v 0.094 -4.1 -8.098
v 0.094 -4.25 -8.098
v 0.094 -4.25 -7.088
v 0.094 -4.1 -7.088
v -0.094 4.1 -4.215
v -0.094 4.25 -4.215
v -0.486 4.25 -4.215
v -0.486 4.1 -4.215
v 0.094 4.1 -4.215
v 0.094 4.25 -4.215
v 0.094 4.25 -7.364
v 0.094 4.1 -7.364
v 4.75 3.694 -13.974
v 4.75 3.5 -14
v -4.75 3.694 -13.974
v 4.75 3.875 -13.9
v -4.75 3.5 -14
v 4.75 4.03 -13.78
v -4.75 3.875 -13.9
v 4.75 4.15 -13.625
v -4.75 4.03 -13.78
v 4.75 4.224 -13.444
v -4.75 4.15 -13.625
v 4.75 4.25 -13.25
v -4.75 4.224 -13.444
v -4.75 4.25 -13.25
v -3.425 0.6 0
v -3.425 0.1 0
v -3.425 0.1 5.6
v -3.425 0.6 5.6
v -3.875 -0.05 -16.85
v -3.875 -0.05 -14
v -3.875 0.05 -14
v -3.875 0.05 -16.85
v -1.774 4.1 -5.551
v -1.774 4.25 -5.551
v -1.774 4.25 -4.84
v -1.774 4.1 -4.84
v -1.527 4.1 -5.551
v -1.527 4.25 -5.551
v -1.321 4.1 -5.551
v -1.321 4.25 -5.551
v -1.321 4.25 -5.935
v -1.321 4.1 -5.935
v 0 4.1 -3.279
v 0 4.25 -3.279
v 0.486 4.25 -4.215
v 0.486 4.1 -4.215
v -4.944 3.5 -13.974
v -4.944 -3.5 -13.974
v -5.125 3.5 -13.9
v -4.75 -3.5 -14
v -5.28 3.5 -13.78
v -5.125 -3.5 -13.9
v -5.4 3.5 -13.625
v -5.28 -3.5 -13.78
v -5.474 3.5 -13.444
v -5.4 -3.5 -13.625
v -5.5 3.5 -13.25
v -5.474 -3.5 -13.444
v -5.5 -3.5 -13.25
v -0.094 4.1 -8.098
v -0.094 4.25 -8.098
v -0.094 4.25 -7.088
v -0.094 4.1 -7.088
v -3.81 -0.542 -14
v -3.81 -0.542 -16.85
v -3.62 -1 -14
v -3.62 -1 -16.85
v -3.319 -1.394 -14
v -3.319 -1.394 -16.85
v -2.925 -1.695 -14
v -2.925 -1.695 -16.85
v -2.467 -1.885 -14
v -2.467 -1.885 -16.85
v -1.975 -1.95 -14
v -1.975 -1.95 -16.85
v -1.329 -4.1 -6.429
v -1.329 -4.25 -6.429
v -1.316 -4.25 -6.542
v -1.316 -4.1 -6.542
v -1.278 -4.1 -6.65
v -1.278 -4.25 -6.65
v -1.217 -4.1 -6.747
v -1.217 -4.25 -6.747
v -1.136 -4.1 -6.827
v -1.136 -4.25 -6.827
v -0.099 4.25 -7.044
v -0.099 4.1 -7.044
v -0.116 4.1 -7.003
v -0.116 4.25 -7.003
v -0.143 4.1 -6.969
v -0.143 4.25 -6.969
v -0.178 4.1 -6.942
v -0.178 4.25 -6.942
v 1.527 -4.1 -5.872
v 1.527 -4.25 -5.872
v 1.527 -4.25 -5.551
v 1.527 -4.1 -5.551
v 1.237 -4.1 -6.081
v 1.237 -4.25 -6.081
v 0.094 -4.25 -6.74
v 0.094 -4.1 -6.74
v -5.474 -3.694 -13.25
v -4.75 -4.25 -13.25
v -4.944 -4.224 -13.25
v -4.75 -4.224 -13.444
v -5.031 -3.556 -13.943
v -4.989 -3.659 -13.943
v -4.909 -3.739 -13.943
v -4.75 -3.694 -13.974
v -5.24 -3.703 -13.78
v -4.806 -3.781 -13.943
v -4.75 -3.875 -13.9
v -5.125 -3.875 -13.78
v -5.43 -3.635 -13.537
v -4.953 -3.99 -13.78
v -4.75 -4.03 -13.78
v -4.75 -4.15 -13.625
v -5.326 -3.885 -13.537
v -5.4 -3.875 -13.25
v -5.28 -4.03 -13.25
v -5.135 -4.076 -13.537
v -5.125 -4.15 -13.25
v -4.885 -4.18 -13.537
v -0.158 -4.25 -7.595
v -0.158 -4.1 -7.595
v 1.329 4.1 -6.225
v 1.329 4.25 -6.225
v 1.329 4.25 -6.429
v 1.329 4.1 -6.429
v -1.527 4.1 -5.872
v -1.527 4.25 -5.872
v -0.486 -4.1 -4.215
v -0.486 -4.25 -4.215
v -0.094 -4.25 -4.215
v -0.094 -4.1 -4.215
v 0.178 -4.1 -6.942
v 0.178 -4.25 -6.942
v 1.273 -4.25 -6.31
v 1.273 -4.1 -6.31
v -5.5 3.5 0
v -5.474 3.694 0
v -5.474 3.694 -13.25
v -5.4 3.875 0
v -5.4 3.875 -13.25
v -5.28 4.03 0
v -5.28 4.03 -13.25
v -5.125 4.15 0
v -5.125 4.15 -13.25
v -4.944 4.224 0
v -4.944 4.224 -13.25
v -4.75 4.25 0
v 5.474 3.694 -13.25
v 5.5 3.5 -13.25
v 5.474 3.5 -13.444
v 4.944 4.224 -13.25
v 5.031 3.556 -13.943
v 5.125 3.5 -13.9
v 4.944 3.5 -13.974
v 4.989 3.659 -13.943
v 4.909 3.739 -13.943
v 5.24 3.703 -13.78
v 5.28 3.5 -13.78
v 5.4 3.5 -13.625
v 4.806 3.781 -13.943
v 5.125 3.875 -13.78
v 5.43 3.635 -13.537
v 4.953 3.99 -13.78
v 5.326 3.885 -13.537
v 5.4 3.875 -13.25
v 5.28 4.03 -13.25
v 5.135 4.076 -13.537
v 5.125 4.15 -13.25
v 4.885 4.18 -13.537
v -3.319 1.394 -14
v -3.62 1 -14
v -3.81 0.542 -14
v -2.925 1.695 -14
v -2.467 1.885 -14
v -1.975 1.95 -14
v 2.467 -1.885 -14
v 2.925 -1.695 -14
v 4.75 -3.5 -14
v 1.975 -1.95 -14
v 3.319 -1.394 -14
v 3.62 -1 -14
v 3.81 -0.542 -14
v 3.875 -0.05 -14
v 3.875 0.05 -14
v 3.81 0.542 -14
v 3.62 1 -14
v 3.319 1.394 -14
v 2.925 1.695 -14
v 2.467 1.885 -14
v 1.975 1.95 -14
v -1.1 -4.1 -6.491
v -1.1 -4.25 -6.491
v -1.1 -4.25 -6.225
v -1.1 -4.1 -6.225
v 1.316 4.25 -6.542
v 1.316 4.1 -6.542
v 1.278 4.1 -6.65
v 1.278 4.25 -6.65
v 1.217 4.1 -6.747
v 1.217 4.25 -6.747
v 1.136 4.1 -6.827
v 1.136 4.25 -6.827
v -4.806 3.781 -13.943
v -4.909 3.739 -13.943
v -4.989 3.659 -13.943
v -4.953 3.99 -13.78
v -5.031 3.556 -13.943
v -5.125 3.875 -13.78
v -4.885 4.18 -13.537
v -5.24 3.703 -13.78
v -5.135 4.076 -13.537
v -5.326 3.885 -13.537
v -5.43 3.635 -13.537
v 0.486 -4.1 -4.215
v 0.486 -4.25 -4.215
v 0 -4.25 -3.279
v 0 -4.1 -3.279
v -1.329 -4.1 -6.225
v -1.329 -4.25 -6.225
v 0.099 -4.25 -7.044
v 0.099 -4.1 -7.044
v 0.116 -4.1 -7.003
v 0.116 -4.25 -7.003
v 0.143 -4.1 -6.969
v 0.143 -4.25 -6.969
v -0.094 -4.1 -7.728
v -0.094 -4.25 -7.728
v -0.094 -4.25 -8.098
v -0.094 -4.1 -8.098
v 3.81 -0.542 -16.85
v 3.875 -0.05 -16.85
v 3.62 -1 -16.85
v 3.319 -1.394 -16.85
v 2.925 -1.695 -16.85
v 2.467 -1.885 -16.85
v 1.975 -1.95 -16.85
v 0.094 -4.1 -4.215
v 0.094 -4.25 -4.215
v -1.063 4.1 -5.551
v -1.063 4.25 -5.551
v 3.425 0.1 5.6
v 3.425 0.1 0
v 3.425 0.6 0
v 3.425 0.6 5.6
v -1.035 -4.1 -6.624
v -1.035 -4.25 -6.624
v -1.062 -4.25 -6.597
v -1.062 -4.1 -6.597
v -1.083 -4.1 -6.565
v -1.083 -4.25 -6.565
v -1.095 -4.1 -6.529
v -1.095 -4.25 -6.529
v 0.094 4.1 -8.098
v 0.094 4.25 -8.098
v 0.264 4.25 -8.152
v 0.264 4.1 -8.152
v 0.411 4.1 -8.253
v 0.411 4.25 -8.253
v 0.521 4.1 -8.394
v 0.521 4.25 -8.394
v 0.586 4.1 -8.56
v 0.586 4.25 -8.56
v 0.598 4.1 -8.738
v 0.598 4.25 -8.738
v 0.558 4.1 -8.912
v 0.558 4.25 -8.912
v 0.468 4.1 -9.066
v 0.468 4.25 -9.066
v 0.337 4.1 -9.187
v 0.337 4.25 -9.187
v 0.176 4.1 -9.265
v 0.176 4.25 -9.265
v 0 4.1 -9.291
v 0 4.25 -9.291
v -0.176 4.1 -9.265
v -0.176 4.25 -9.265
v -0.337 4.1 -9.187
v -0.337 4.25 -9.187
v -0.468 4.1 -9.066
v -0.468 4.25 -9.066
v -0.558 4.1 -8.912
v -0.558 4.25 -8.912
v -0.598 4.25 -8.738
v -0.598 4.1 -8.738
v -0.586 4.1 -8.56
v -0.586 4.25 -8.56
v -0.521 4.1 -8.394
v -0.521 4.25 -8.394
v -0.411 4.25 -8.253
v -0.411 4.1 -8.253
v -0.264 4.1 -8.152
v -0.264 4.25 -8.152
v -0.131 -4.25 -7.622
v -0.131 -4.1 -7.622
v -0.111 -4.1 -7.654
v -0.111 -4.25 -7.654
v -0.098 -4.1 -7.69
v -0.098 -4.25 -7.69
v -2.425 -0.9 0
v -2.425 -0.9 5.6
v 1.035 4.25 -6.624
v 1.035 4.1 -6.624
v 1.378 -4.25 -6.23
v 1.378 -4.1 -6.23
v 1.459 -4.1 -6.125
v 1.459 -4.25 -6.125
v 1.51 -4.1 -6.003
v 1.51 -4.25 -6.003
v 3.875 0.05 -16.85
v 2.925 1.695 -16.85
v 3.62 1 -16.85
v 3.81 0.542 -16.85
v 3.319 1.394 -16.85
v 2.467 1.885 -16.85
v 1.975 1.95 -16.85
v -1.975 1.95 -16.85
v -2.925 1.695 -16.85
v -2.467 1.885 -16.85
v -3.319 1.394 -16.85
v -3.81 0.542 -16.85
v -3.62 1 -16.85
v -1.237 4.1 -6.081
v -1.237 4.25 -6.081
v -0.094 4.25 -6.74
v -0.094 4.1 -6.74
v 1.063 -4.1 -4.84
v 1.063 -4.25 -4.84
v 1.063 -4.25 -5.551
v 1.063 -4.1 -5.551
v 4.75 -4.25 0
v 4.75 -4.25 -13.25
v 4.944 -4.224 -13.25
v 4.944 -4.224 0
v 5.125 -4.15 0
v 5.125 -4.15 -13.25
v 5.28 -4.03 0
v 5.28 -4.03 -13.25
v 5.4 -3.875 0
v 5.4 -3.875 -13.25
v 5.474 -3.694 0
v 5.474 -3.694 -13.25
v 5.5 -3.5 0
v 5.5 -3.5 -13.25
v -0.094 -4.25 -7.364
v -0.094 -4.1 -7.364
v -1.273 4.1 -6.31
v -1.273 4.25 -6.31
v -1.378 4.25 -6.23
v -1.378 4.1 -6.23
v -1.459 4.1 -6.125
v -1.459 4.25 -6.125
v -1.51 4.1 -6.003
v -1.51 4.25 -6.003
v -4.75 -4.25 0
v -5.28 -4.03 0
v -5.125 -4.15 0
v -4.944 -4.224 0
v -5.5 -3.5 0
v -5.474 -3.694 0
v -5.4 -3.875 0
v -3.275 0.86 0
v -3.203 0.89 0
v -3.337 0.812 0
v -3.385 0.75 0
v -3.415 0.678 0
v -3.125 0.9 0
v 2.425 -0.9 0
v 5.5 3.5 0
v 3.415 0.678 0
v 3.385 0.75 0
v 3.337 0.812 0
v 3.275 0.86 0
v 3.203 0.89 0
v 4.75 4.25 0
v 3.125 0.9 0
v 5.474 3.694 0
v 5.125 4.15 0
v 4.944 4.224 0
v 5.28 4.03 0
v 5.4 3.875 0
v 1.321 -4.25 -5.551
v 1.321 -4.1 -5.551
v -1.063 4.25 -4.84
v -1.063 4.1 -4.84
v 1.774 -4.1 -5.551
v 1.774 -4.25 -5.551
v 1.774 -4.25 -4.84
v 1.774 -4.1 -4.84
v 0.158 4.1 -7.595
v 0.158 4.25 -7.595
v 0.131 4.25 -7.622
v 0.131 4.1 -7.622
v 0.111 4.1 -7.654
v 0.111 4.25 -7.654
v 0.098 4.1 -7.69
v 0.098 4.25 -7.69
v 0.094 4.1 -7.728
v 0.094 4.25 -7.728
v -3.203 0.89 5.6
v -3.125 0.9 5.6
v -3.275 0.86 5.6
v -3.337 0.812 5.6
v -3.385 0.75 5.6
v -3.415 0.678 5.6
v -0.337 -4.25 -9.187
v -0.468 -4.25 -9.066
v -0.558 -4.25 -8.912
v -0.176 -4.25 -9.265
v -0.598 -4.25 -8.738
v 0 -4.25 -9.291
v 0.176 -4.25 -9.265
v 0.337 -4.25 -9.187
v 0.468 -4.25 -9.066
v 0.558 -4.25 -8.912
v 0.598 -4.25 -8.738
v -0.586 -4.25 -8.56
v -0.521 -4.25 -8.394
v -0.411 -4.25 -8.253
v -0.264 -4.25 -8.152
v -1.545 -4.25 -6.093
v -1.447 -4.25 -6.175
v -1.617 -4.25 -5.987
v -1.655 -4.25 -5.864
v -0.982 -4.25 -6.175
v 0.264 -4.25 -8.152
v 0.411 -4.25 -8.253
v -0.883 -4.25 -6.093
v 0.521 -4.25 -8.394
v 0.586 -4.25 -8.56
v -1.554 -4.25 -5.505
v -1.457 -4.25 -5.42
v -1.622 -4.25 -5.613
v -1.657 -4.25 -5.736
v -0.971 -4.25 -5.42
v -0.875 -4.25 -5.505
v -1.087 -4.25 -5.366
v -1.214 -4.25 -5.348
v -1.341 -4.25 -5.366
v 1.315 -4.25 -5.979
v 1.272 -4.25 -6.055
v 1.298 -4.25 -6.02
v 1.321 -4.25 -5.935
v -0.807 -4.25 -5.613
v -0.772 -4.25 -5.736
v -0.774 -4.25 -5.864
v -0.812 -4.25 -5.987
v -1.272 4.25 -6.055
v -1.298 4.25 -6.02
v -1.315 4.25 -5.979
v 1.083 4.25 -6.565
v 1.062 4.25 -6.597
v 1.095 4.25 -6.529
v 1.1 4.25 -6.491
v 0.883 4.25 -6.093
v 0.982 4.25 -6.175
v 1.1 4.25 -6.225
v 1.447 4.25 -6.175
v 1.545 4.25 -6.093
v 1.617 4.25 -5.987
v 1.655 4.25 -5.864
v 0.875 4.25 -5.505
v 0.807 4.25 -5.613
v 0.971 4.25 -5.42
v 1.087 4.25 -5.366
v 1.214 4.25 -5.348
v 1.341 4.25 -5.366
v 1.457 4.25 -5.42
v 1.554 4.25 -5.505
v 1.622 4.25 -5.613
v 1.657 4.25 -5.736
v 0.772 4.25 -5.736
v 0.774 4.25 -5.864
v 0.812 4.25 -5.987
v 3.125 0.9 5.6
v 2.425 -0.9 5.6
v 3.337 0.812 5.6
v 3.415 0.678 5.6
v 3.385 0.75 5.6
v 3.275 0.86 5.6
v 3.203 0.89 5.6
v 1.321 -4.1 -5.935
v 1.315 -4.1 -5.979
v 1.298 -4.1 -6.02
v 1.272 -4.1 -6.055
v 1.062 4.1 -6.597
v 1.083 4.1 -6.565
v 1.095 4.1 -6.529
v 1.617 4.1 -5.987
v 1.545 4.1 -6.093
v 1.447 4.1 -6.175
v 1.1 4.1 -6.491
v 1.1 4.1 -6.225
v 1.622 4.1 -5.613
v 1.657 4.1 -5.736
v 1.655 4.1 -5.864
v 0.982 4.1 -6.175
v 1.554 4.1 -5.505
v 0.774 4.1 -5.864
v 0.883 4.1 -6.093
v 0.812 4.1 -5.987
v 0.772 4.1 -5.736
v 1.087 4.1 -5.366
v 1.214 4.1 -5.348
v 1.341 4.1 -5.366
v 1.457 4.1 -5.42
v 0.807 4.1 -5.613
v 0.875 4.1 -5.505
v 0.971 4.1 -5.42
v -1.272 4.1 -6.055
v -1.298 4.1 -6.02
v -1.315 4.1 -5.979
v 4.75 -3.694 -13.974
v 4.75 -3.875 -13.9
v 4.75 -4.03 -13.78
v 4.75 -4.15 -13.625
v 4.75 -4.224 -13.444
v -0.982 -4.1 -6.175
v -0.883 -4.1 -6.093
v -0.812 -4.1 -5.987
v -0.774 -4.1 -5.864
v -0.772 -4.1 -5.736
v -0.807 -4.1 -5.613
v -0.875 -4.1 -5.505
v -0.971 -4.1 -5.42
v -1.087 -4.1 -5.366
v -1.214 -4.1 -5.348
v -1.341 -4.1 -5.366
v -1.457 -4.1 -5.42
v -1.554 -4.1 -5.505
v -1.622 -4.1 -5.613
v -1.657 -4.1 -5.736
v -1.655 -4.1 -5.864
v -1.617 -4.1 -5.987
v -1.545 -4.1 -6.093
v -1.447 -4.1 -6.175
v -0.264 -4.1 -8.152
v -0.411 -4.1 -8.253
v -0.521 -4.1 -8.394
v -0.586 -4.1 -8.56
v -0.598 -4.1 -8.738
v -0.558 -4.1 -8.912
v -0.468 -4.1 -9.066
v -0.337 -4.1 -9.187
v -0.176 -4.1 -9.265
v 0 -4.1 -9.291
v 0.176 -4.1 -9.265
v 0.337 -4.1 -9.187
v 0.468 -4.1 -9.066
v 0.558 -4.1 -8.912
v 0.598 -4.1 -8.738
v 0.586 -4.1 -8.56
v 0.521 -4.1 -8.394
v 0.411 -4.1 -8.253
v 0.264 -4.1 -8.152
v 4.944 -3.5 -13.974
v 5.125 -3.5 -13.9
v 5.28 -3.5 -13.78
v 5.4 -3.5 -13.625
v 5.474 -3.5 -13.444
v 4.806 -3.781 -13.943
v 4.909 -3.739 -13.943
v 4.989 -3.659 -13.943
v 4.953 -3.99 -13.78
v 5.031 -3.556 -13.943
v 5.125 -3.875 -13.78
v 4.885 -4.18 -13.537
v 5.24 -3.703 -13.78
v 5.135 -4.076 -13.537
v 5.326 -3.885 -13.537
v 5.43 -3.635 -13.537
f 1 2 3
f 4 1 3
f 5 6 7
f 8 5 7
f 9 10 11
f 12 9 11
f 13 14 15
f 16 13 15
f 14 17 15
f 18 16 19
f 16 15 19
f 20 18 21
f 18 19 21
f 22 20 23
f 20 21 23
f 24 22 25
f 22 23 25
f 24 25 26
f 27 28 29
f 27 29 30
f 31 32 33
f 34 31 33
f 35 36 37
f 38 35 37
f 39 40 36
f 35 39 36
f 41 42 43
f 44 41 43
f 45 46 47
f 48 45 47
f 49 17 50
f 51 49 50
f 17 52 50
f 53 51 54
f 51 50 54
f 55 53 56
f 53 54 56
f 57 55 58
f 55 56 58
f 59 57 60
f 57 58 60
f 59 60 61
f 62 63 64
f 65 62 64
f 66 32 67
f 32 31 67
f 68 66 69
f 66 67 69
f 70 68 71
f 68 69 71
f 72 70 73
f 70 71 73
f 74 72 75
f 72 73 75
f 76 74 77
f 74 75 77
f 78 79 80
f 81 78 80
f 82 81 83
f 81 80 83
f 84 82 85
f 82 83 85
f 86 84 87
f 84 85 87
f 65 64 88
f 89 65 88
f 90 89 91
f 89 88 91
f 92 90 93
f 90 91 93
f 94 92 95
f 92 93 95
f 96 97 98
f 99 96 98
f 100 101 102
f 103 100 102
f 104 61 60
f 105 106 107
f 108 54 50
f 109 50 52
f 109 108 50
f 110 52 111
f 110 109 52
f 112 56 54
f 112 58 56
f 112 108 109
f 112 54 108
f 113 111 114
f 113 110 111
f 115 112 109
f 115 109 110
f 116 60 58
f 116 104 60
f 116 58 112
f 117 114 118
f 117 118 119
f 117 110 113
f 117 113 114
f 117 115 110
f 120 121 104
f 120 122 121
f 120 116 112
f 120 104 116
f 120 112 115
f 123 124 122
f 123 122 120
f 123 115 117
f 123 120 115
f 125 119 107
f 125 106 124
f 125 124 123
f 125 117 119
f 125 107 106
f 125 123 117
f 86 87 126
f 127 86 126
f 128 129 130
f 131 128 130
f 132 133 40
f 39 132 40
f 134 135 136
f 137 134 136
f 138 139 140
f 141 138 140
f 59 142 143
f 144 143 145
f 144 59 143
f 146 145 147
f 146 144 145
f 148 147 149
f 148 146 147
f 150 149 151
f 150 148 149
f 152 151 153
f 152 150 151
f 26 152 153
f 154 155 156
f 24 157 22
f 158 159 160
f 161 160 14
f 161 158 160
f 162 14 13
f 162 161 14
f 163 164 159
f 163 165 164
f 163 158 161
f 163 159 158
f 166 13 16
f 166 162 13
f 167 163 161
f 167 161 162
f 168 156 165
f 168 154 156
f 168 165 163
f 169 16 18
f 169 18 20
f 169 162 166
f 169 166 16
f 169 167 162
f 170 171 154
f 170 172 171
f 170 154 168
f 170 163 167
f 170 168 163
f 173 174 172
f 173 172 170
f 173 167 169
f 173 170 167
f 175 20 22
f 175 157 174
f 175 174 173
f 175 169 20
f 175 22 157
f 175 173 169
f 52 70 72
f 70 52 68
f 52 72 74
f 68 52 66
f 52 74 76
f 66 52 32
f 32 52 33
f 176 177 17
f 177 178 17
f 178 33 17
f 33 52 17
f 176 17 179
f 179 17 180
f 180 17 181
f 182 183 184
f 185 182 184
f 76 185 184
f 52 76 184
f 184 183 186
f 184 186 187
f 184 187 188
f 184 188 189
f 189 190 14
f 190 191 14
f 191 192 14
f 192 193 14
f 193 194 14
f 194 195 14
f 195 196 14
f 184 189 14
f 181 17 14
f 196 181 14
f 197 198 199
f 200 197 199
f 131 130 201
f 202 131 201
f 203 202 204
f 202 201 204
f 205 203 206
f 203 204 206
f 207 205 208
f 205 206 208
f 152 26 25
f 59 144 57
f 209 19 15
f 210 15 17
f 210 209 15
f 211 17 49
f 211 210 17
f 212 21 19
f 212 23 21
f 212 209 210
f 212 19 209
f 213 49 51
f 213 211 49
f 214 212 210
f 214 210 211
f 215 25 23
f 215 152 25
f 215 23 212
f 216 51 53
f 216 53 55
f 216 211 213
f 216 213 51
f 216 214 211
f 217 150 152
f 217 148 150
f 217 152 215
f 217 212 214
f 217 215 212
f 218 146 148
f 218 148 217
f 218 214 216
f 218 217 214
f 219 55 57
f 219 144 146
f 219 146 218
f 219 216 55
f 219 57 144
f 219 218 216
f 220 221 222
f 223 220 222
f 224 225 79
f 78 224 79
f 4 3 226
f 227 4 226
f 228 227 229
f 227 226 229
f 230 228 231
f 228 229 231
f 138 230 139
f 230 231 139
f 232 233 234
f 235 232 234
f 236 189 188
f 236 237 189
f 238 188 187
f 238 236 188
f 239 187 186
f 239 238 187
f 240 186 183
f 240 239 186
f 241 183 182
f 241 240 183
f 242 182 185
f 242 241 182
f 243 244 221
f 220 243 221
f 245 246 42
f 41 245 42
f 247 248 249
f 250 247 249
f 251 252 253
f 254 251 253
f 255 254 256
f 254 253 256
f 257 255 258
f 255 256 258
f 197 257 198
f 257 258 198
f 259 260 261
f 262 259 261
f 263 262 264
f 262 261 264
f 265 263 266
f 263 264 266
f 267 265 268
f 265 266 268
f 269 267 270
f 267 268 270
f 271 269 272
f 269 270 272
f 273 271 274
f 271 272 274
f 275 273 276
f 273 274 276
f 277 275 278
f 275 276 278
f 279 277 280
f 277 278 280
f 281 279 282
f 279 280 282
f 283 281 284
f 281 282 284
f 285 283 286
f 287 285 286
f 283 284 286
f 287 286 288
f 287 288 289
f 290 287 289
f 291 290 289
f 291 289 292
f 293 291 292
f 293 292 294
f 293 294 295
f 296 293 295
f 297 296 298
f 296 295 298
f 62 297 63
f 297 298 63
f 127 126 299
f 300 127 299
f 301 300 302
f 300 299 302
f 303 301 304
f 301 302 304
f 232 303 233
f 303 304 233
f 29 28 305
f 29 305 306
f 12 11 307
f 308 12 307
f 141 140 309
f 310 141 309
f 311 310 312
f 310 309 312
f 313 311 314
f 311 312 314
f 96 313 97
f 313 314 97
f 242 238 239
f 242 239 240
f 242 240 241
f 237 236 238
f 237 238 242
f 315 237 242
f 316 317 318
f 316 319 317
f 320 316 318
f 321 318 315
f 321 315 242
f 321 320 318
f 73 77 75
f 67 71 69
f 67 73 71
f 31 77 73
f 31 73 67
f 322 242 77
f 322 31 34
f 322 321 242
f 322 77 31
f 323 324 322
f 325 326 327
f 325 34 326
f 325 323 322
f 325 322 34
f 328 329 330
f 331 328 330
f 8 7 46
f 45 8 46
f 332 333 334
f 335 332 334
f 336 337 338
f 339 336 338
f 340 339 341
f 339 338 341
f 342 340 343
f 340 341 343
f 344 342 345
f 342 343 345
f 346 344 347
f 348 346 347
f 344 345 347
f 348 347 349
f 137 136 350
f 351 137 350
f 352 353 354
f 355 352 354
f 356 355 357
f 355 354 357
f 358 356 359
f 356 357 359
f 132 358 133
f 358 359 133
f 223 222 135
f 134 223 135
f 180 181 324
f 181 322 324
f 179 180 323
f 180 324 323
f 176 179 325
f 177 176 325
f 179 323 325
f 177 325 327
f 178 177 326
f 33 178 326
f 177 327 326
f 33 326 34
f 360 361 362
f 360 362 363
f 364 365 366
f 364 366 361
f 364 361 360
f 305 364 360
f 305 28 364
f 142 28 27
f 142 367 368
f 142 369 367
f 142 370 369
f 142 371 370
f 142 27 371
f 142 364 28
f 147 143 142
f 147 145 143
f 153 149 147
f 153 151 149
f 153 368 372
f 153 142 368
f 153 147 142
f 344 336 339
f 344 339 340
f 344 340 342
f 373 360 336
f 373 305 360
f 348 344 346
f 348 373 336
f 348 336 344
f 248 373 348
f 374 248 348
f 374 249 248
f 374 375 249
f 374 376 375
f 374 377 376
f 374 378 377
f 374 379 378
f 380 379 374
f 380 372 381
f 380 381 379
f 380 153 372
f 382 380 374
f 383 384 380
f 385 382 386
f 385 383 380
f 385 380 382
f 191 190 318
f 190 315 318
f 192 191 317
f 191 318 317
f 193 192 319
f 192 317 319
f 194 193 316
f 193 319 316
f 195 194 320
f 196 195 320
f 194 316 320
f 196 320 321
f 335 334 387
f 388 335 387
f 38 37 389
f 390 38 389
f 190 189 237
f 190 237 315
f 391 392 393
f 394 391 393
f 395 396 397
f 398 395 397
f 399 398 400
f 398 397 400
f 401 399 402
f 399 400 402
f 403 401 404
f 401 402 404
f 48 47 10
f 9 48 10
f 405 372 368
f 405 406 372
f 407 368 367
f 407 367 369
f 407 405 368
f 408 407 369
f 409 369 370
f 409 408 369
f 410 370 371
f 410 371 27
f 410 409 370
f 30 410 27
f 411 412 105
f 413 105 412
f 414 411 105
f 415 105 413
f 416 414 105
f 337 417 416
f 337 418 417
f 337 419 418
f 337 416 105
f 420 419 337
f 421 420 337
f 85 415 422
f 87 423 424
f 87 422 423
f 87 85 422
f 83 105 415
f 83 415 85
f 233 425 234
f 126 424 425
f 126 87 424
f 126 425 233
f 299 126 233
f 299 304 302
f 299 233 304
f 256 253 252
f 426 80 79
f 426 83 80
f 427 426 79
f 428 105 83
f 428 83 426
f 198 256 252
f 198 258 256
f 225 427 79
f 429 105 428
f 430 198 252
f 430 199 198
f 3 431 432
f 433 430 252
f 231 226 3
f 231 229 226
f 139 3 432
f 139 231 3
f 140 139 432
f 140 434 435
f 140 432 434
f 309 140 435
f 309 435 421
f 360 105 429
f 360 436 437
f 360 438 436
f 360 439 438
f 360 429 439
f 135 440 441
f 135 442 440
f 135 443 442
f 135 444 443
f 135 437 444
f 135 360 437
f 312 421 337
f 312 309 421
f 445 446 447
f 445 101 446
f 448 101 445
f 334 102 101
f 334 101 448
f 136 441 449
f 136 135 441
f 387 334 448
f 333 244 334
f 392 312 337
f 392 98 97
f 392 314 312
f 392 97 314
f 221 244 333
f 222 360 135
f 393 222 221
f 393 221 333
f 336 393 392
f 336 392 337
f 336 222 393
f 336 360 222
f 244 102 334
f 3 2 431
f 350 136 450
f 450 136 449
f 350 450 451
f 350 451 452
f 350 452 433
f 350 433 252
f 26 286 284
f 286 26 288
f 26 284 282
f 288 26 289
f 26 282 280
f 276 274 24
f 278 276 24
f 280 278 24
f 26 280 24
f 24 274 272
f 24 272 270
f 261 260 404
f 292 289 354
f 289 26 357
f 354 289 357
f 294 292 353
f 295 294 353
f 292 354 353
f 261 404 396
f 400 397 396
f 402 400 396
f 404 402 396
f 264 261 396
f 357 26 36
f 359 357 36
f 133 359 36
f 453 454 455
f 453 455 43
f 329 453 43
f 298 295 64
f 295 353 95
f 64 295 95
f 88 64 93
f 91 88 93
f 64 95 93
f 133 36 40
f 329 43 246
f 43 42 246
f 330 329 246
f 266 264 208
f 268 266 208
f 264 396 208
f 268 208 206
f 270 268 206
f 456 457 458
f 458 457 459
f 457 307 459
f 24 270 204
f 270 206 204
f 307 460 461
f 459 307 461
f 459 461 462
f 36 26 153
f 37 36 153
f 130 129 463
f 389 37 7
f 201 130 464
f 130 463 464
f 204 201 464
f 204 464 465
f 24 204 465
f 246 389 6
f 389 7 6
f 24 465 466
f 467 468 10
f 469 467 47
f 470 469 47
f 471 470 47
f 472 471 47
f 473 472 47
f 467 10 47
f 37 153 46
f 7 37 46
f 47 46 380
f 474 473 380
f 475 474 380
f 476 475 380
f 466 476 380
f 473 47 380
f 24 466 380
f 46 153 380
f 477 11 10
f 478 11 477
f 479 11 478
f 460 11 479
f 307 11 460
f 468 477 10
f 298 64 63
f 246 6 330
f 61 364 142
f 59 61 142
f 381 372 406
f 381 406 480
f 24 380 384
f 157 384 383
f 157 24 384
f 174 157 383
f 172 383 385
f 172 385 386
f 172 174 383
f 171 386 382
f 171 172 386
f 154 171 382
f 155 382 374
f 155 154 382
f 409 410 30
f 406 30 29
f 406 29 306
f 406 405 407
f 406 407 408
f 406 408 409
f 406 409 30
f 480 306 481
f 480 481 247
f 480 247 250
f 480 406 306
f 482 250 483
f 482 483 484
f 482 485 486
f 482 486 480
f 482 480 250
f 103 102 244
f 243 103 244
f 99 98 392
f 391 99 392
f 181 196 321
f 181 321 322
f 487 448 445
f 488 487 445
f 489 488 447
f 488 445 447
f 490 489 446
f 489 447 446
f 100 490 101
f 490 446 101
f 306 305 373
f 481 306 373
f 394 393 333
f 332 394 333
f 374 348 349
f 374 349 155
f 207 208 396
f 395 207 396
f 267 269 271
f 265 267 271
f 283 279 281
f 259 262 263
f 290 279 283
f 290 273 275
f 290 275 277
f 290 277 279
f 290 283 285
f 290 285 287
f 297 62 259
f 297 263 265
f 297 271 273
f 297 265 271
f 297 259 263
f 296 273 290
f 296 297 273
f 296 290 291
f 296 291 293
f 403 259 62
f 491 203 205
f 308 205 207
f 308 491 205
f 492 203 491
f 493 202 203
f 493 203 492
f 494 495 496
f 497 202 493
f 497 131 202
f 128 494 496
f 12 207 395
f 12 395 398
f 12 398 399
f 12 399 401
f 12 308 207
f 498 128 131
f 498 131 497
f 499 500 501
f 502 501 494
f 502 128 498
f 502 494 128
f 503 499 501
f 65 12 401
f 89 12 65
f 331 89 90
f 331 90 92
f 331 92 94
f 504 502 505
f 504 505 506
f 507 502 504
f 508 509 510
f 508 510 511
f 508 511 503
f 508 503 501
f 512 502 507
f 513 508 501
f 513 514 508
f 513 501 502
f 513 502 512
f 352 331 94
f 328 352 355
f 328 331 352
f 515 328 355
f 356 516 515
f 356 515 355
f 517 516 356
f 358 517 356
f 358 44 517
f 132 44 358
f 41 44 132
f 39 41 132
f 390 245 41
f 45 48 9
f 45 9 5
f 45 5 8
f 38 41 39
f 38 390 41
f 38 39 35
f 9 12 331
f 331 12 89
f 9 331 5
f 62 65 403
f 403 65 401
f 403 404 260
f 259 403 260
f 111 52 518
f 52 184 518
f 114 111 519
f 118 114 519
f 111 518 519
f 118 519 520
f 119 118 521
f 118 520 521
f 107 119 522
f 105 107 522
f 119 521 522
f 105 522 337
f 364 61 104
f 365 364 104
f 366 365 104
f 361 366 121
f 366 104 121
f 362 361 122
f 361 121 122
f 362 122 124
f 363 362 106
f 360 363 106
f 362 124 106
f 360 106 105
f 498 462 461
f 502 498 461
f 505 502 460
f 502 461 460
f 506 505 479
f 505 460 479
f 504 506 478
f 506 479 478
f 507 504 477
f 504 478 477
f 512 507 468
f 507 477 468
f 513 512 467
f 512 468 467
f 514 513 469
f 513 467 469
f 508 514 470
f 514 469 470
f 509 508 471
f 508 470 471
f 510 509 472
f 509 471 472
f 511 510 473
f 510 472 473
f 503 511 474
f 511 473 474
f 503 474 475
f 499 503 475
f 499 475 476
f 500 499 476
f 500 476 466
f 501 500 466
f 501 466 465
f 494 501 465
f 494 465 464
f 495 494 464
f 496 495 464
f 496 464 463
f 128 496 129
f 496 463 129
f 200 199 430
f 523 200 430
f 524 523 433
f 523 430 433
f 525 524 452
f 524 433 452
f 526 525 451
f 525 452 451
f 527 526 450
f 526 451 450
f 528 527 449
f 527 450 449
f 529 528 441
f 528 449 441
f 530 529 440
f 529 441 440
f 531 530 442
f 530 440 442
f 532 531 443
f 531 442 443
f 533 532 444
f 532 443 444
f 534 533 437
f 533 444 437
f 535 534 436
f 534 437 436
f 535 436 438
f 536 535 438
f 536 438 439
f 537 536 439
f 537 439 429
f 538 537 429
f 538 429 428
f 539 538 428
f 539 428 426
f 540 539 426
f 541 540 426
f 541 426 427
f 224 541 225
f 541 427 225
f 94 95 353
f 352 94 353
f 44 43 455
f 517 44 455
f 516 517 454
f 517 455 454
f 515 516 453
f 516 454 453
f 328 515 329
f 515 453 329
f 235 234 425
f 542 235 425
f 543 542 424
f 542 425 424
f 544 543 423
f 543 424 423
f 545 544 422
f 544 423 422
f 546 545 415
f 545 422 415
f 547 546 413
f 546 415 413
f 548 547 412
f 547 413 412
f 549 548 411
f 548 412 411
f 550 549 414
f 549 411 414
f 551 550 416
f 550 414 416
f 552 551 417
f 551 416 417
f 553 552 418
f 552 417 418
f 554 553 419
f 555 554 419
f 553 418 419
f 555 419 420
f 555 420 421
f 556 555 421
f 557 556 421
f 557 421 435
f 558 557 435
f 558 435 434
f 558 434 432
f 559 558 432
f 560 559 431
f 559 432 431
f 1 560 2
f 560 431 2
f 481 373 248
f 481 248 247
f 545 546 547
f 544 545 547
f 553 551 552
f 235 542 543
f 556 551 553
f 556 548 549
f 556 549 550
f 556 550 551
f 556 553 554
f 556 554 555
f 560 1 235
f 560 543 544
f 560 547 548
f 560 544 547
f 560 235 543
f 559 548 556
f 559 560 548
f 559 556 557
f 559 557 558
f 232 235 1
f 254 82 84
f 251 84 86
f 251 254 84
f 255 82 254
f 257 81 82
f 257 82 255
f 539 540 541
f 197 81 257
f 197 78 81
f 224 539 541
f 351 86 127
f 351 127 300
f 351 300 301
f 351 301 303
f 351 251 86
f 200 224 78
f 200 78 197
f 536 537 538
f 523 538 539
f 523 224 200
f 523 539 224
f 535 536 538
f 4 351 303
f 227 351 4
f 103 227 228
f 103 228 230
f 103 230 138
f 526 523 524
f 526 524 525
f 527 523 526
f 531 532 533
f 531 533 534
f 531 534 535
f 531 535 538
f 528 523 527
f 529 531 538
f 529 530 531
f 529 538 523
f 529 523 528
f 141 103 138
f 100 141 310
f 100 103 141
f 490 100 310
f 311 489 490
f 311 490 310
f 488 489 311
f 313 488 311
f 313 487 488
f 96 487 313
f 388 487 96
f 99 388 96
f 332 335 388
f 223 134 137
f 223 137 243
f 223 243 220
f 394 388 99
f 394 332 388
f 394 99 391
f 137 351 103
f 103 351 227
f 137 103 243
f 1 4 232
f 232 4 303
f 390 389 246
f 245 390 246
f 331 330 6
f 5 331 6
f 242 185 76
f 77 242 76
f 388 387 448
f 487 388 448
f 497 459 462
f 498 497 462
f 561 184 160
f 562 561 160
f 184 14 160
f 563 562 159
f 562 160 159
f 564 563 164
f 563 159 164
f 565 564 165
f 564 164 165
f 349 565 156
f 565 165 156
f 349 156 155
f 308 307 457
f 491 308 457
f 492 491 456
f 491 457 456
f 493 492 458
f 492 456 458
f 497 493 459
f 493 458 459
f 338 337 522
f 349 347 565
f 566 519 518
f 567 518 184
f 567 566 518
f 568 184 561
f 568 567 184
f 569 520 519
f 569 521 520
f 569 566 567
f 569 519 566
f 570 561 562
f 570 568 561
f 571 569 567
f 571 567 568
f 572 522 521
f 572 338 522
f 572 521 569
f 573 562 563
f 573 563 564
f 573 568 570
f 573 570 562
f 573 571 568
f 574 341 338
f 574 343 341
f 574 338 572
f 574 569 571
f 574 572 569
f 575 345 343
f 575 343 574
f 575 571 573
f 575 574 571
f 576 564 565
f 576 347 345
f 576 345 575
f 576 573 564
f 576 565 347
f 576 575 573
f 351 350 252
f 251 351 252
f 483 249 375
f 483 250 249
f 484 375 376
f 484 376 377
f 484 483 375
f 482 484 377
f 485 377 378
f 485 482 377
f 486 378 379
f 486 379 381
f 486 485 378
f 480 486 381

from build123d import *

# Parameters (mm, degrees)
SKETCH1_W           = 11
SKETCH1_H           = 8.5
BOSS_EXTRUDE1_DEPTH = 14
SKETCH2_W           = 7.75
SKETCH2_H           = 3.9
BOSS_EXTRUDE2_DEPTH = 2.85
SKETCH4_W           = 6.85
SKETCH4_H           = 1.8
BOSS_EXTRUDE4_DEPTH = 5.6
FILLET6_R           = 0.3
CHAMFER1_SIZE       = 1
CUT_EXTRUDE1_DEPTH  = 0.15
CIRPATTERN1_COUNT   = 2
FILLET1_R           = 1.9
FILLET3_R           = 0.75
FILLET4_R           = 0.75


with BuildPart() as part:
    # Sketch1 → Boss-Extrude1 (new body)
    with BuildSketch(Plane.XY):
        Rectangle(SKETCH1_W, SKETCH1_H)
    extrude(amount=-BOSS_EXTRUDE1_DEPTH)

    # Sketch2 → Boss-Extrude2 (add)
    with BuildSketch(Plane(origin=(0, 0, -14), x_dir=(-1, 0, 0), z_dir=(0, 0, -1))):
        Rectangle(SKETCH2_W, SKETCH2_H)
    extrude(amount=BOSS_EXTRUDE2_DEPTH)

    # Sketch4 → Boss-Extrude4 (add)
    with BuildSketch(Plane.XY):
        Rectangle(SKETCH4_W, SKETCH4_H)
    extrude(amount=BOSS_EXTRUDE4_DEPTH)

    # Fillet6
    fillet6_edges = [part.edges().sort_by_distance(p)[0] for p in [
        (3.425, 0.9, 2.8),
        (-3.425, 0.9, 2.8),
    ]]
    fillet(fillet6_edges, radius=FILLET6_R)

    # Chamfer1
    chamfer1_edges = [part.edges().sort_by_distance(p)[0] for p in [
        (-3.425, -0.9, 2.8),
        (3.425, -0.9, 2.8),
    ]]
    chamfer(chamfer1_edges, length=CHAMFER1_SIZE)

    # Sketch5 → Cut-Extrude1 (cut)
    with BuildSketch(Plane.XZ.offset(4.25)):
        with BuildLine():
            Line((0, -3.279495805), (-0.485840634, -4.214842566))
            Line((-0.485840634, -4.214842566), (-0.093629021, -4.214842566))
            Line((-0.093629021, -4.214842566), (-0.093629021, -7.363659965))
            Line((-0.093629021, -7.363659965), (-1.035027967, -6.623865099))
            ThreePointArc((-1.035027967, -6.623865099), (-1.082535613, -6.564943154), (-1.099509752, -6.491182388))
            Line((-1.099509752, -6.491182388), (-1.099509752, -6.225332236))
            ThreePointArc((-1.099509752, -6.225332236), (-1.214270304, -5.348067145), (-1.329030856, -6.225332236))
            Line((-1.329030856, -6.225332236), (-1.329030856, -6.428798928))
            ThreePointArc((-1.329030856, -6.428798928), (-1.278108438, -6.650081225), (-1.135585502, -6.82684706))
            Line((-1.135585502, -6.82684706), (-0.158110806, -7.59499192))
            ThreePointArc((-0.158110806, -7.59499192), (-0.11060316, -7.653913865), (-0.093629021, -7.727674631))
            Line((-0.093629021, -7.727674631), (-0.093629021, -8.098323238))
            ThreePointArc((-0.093629021, -8.098323238), (0, -9.291083784), (0.093629021, -8.098323238))
            Line((0.093629021, -8.098323238), (0.093629021, -7.087908213))
            ThreePointArc((0.093629021, -7.087908213), (0.116268533, -7.003479025), (0.178112432, -6.941703889))
            Line((0.178112432, -6.941703889), (1.273368459, -6.310440139))
            ThreePointArc((1.273368459, -6.310440139), (1.458900155, -6.12511473), (1.526818691, -5.871827167))
            Line((1.526818691, -5.871827167), (1.526818691, -5.55143287))
            Line((1.526818691, -5.55143287), (1.774241614, -5.55143287))
            Line((1.774241614, -5.55143287), (1.774241614, -4.840448102))
            Line((1.774241614, -4.840448102), (1.063256846, -4.840448102))
            Line((1.063256846, -4.840448102), (1.063256846, -5.55143287))
            Line((1.063256846, -5.55143287), (1.321069322, -5.55143287))
            Line((1.321069322, -5.55143287), (1.321069322, -5.935219876))
            ThreePointArc((1.321069322, -5.935219876), (1.29842981, -6.019649064), (1.236585912, -6.081424201))
            Line((1.236585912, -6.081424201), (0.093629021, -6.740180906))
            Line((0.093629021, -6.740180906), (0.093629021, -4.214842566))
            Line((0.093629021, -4.214842566), (0.485840634, -4.214842566))
            Line((0.485840634, -4.214842566), (0, -3.279495805))
        make_face()
    cut_extrude1 = extrude(amount=-CUT_EXTRUDE1_DEPTH, mode=Mode.SUBTRACT)

    # CirPattern1: Cut-Extrude1 ×2 about axis
    cirpattern1_axis = Axis((0, 0, -122.9725), (0, 0, 1))
    for i in range(1, CIRPATTERN1_COUNT):
        add(cut_extrude1.rotate(cirpattern1_axis, i * 360 / CIRPATTERN1_COUNT), mode=Mode.SUBTRACT)

    # Fillet1
    fillet1_edges = [part.edges().sort_by_distance(p)[0] for p in [
        (-3.875, -1.95, -15.425),
        (-3.875, 1.95, -15.425),
        (3.875, -1.95, -15.425),
        (3.875, 1.95, -15.425),
    ]]
    fillet(fillet1_edges, radius=FILLET1_R)

    # Fillet3
    fillet3_edges = [part.edges().sort_by_distance(p)[0] for p in [
        (5.5, -4.25, -7),
        (-5.5, -4.25, -7),
        (-5.5, 4.25, -7),
        (5.5, 4.25, -7),
    ]]
    fillet(fillet3_edges, radius=FILLET3_R)

    # Fillet4
    fillet4_edges = [part.edges().sort_by_distance(p)[0] for p in [
        (5.280330086, 4.030330086, -14),
        (5.5, 0, -14),
        (5.280330086, -4.030330086, -14),
        (0, -4.25, -14),
        (-5.280330086, -4.030330086, -14),
        (-5.5, 0, -14),
        (-5.280330086, 4.030330086, -14),
        (0, 4.25, -14),
    ]]
    fillet(fillet4_edges, radius=FILLET4_R)


solid = part.part
